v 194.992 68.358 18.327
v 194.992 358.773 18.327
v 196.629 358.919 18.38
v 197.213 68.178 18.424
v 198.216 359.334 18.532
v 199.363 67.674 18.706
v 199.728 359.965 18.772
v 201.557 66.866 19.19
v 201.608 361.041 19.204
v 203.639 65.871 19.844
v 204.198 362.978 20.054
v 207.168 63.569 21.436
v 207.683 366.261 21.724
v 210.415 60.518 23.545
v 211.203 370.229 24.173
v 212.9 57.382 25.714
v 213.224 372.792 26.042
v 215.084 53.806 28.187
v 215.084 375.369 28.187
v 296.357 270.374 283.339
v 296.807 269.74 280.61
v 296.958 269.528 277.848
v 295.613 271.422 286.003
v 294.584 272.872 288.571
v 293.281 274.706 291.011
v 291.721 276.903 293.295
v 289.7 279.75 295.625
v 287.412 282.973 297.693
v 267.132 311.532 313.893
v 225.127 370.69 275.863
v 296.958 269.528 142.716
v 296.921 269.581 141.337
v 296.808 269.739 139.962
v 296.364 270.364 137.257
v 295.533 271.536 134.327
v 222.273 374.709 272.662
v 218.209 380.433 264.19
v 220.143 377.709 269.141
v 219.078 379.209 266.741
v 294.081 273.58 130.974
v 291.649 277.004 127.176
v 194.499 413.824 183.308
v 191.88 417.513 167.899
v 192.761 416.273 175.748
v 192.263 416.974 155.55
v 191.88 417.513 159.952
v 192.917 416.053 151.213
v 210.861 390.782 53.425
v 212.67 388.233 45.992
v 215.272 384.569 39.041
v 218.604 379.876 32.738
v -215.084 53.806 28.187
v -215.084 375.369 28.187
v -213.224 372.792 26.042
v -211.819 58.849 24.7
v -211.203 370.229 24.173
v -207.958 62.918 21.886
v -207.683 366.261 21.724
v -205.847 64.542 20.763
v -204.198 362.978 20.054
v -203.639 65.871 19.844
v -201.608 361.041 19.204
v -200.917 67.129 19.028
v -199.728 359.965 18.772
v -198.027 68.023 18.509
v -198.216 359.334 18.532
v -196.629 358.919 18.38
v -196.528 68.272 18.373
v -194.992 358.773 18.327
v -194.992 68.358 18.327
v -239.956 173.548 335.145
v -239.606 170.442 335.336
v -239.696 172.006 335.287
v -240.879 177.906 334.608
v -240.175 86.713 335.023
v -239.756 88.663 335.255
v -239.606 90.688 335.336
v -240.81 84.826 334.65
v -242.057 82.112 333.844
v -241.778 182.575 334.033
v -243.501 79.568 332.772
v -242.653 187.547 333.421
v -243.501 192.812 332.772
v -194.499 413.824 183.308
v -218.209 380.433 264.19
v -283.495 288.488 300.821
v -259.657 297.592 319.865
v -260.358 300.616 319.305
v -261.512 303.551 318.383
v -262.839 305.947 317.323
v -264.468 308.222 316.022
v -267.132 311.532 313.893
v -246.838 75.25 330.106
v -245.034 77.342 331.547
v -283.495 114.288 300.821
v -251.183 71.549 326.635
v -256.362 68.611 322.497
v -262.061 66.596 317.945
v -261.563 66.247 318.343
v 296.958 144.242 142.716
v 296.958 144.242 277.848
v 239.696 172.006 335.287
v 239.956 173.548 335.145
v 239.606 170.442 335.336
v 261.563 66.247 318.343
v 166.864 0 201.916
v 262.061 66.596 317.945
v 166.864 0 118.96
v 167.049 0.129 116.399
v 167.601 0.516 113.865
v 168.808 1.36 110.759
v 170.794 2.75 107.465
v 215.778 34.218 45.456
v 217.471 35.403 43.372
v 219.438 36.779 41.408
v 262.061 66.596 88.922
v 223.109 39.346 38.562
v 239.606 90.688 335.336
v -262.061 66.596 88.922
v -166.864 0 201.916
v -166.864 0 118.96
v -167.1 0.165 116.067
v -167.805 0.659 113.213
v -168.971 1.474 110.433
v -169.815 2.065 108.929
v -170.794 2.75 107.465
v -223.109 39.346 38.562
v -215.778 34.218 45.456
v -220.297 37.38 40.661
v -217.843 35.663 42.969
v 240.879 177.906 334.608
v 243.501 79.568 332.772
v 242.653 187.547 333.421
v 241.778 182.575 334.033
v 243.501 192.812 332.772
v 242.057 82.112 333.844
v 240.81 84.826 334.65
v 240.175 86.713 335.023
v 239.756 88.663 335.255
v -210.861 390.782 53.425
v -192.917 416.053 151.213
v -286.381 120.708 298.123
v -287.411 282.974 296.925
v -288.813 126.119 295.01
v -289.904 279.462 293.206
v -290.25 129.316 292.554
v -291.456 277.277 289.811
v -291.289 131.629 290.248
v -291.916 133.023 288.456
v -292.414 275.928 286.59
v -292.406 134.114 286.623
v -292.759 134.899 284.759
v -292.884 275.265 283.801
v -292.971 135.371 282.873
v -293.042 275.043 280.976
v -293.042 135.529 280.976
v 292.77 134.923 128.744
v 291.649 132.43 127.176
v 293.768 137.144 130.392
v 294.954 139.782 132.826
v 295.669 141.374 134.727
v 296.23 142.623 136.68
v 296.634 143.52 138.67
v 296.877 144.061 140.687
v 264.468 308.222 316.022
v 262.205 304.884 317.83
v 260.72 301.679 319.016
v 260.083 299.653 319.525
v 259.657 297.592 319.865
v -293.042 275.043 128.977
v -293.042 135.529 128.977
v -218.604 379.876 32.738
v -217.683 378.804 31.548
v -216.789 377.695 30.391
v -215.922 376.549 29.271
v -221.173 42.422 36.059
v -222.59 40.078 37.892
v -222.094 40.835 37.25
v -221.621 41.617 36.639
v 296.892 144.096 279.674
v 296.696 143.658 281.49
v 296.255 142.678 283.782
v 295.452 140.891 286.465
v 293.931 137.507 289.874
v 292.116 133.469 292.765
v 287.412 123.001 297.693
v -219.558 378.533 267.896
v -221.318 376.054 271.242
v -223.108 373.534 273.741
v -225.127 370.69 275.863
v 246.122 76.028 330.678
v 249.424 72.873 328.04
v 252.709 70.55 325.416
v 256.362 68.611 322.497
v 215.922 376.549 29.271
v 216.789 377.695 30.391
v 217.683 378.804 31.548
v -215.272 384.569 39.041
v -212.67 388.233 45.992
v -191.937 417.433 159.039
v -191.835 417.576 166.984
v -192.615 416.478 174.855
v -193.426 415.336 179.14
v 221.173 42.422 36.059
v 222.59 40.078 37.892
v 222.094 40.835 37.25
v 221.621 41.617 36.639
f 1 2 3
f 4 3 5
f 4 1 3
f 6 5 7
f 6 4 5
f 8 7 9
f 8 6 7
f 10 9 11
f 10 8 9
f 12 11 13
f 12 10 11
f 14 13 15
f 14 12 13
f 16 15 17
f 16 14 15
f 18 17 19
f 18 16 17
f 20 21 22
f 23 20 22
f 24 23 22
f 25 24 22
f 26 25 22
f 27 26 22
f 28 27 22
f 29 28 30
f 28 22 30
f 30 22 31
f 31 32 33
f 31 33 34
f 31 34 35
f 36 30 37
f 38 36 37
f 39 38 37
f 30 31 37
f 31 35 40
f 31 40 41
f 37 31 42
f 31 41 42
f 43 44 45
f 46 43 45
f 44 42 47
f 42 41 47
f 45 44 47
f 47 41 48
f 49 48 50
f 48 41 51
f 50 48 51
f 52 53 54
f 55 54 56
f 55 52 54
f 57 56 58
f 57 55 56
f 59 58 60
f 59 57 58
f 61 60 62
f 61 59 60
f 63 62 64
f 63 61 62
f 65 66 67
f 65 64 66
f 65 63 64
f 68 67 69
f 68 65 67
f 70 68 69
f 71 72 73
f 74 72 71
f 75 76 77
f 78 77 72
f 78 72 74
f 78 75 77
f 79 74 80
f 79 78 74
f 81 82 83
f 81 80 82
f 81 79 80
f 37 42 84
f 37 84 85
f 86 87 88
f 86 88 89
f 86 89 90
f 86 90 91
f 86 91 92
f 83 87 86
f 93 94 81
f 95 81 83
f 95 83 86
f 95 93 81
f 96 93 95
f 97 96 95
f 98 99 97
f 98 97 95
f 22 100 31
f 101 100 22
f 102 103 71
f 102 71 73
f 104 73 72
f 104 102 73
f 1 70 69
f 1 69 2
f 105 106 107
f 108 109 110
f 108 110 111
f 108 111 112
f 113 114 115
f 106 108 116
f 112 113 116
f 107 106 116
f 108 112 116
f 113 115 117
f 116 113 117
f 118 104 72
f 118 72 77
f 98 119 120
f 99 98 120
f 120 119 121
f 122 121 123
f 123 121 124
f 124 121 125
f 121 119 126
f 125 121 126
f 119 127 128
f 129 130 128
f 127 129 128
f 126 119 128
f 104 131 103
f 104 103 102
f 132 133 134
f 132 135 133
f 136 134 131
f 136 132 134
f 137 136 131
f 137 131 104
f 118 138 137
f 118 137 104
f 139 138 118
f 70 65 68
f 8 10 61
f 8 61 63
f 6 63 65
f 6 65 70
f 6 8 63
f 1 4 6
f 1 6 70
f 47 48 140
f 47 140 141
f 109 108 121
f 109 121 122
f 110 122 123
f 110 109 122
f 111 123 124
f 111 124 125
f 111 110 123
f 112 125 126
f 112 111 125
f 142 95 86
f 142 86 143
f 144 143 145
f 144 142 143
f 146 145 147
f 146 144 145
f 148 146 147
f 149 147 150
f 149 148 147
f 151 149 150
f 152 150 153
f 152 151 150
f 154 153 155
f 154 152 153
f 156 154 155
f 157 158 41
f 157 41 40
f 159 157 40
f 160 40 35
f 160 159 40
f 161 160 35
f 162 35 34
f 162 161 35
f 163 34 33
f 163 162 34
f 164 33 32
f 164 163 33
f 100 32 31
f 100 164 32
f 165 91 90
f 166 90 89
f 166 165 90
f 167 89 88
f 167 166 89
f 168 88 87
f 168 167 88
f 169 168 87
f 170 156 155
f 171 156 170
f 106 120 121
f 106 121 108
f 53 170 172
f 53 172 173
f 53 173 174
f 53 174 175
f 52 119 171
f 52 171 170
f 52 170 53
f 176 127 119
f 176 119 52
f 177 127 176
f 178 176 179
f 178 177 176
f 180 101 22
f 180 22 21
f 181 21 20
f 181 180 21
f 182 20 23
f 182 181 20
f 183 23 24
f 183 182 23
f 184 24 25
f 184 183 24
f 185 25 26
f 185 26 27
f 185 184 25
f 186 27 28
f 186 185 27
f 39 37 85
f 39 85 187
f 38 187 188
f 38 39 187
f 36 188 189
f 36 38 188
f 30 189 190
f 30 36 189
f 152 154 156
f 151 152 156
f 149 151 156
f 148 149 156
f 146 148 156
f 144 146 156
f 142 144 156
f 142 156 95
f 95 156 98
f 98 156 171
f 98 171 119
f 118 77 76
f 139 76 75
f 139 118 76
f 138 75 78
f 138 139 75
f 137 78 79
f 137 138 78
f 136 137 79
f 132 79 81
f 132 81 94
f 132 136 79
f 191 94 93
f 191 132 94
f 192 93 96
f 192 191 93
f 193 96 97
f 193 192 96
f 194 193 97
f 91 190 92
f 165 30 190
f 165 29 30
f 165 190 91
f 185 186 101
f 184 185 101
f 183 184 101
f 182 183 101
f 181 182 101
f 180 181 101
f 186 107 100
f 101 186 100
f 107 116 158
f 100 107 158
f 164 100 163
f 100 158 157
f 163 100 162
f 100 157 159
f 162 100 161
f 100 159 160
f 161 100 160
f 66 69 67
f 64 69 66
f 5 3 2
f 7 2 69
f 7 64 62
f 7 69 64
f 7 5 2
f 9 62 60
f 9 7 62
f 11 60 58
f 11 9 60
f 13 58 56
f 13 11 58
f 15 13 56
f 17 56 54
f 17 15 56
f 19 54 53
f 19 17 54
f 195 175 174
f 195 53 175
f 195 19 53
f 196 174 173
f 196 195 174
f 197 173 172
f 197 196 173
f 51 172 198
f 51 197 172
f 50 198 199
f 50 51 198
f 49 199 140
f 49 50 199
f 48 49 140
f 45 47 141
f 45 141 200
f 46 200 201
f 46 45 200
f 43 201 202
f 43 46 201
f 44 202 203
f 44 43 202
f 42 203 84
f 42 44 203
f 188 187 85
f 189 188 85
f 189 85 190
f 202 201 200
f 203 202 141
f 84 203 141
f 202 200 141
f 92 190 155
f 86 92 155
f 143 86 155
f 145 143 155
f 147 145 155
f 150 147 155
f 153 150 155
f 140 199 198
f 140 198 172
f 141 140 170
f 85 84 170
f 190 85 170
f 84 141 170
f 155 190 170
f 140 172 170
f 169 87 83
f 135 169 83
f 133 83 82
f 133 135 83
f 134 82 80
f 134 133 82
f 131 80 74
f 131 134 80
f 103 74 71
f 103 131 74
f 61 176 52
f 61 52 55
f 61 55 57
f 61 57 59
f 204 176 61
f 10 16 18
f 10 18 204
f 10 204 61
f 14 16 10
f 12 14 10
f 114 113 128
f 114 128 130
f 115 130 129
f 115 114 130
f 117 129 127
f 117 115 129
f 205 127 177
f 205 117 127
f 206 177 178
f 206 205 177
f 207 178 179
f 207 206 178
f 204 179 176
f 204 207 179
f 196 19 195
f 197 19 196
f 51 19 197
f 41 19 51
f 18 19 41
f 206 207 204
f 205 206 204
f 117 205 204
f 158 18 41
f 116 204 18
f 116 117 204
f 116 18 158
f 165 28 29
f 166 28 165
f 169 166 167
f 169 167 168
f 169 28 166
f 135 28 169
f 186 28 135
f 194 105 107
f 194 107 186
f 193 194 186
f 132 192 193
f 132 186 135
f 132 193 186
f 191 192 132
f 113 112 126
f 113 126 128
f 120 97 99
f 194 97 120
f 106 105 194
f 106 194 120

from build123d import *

# Parameters (mm, degrees)
F2_DEPTH = 431.8
F3_DEPTH = 300
F5_DEPTH = 335.336541


with BuildPart() as f2:
    # F0 (on Front) → F2 (new body)
    with BuildSketch(Plane.XZ):
        with BuildLine():
            ThreePointArc((-215.083709, 28.186797), (-206.182504, 20.924757), (-194.992326, 18.326948))
            Line((-194.992326, 18.326948), (194.992326, 18.326948))
            ThreePointArc((194.992326, 18.326948), (206.182504, 20.924757), (215.083709, 28.186797))
            Line((215.083709, 28.186797), (291.649465, 127.176309))
            ThreePointArc((291.649465, 127.176309), (295.594316, 134.505526), (296.958081, 142.71646))
            Line((296.958081, 142.71646), (296.958081, 277.847902))
            ThreePointArc((296.958081, 277.847902), (294.447383, 288.858799), (287.411636, 297.692921))
            Line((287.411636, 297.692921), (243.500706, 332.771967))
            ThreePointArc((243.500706, 332.771967), (236.046451, 336.898009), (227.647151, 338.326948))
            Line((227.647151, 338.326948), (-227.647151, 338.326948))
            ThreePointArc((-227.647151, 338.326948), (-236.046451, 336.898009), (-243.500706, 332.771967))
            Line((-243.500706, 332.771967), (-283.495474, 300.821419))
            ThreePointArc((-283.495474, 300.821419), (-290.531221, 291.987297), (-293.041919, 280.9764))
            Line((-293.041919, 280.9764), (-293.041919, 128.976569))
            Line((-293.041919, 128.976569), (-215.083709, 28.186797))
        make_face()
    extrude(amount=-F2_DEPTH)

    # F1 (on Right) → F3 (intersect, symmetric)
    with BuildSketch(Plane.YZ):
        with BuildLine():
            Line((80.317164, 15.33554), (122.591108, 15.33554))
            Line((122.591108, 15.33554), (341.597618, 15.33554))
            ThreePointArc((341.597618, 15.33554), (372.701891, 25.971325), (390.78182, 53.425138))
            Line((390.78182, 53.425138), (416.052516, 151.212684))
            ThreePointArc((416.052516, 151.212684), (417.546314, 167.441665), (413.824101, 183.308498))
            Line((413.824101, 183.308498), (380.432576, 264.190209))
            ThreePointArc((380.432576, 264.190209), (376.455207, 270.772931), (370.689926, 275.863436))
            Line((370.689926, 275.863436), (308.221791, 316.021523))
            ThreePointArc((308.221791, 316.021523), (303.123356, 318.542104), (297.591884, 319.86505))
            Line((297.591884, 319.86505), (173.547573, 335.145001))
            ThreePointArc((173.547573, 335.145001), (171.997825, 335.287861), (170.442237, 335.33554))
            Line((170.442237, 335.33554), (122.591108, 335.33554))
            Line((122.591108, 335.33554), (90.687651, 335.33554))
            ThreePointArc((90.687651, 335.33554), (77.918617, 331.892584), (68.611255, 322.497098))
            Line((68.611255, 322.497098), (0, 201.915771))
            Line((0, 201.915771), (0, 118.959656))
            ThreePointArc((0, 118.959656), (0.696999, 113.050193), (2.749745, 107.465051))
            Line((2.749745, 107.465051), (34.218363, 45.45577))
            ThreePointArc((34.218363, 45.45577), (37.734355, 40.245886), (42.421994, 36.058868))
            Line((42.421994, 36.058868), (65.87054, 19.844034))
            ThreePointArc((65.87054, 19.844034), (72.750271, 16.488847), (80.317164, 15.33554))
        make_face()
    extrude(amount=F3_DEPTH, both=True, mode=Mode.INTERSECT)

    # F4 (on Top) → F5 (intersect, through all)
    with BuildSketch(Plane.XY):
        Polygon((-166.86368, 0), (0, 0), (166.86368, 0), (262.060732, 66.595584), (297.64843, 145.778194), (297.64843, 268.555701), (190.885365, 418.913692), (0, 418.913692), (-190.885365, 418.913692), (-297.64843, 268.555701), (-297.64843, 145.778194), (-262.060732, 66.595584), align=None)
    extrude(amount=F5_DEPTH, mode=Mode.INTERSECT)


solid = f2.part
